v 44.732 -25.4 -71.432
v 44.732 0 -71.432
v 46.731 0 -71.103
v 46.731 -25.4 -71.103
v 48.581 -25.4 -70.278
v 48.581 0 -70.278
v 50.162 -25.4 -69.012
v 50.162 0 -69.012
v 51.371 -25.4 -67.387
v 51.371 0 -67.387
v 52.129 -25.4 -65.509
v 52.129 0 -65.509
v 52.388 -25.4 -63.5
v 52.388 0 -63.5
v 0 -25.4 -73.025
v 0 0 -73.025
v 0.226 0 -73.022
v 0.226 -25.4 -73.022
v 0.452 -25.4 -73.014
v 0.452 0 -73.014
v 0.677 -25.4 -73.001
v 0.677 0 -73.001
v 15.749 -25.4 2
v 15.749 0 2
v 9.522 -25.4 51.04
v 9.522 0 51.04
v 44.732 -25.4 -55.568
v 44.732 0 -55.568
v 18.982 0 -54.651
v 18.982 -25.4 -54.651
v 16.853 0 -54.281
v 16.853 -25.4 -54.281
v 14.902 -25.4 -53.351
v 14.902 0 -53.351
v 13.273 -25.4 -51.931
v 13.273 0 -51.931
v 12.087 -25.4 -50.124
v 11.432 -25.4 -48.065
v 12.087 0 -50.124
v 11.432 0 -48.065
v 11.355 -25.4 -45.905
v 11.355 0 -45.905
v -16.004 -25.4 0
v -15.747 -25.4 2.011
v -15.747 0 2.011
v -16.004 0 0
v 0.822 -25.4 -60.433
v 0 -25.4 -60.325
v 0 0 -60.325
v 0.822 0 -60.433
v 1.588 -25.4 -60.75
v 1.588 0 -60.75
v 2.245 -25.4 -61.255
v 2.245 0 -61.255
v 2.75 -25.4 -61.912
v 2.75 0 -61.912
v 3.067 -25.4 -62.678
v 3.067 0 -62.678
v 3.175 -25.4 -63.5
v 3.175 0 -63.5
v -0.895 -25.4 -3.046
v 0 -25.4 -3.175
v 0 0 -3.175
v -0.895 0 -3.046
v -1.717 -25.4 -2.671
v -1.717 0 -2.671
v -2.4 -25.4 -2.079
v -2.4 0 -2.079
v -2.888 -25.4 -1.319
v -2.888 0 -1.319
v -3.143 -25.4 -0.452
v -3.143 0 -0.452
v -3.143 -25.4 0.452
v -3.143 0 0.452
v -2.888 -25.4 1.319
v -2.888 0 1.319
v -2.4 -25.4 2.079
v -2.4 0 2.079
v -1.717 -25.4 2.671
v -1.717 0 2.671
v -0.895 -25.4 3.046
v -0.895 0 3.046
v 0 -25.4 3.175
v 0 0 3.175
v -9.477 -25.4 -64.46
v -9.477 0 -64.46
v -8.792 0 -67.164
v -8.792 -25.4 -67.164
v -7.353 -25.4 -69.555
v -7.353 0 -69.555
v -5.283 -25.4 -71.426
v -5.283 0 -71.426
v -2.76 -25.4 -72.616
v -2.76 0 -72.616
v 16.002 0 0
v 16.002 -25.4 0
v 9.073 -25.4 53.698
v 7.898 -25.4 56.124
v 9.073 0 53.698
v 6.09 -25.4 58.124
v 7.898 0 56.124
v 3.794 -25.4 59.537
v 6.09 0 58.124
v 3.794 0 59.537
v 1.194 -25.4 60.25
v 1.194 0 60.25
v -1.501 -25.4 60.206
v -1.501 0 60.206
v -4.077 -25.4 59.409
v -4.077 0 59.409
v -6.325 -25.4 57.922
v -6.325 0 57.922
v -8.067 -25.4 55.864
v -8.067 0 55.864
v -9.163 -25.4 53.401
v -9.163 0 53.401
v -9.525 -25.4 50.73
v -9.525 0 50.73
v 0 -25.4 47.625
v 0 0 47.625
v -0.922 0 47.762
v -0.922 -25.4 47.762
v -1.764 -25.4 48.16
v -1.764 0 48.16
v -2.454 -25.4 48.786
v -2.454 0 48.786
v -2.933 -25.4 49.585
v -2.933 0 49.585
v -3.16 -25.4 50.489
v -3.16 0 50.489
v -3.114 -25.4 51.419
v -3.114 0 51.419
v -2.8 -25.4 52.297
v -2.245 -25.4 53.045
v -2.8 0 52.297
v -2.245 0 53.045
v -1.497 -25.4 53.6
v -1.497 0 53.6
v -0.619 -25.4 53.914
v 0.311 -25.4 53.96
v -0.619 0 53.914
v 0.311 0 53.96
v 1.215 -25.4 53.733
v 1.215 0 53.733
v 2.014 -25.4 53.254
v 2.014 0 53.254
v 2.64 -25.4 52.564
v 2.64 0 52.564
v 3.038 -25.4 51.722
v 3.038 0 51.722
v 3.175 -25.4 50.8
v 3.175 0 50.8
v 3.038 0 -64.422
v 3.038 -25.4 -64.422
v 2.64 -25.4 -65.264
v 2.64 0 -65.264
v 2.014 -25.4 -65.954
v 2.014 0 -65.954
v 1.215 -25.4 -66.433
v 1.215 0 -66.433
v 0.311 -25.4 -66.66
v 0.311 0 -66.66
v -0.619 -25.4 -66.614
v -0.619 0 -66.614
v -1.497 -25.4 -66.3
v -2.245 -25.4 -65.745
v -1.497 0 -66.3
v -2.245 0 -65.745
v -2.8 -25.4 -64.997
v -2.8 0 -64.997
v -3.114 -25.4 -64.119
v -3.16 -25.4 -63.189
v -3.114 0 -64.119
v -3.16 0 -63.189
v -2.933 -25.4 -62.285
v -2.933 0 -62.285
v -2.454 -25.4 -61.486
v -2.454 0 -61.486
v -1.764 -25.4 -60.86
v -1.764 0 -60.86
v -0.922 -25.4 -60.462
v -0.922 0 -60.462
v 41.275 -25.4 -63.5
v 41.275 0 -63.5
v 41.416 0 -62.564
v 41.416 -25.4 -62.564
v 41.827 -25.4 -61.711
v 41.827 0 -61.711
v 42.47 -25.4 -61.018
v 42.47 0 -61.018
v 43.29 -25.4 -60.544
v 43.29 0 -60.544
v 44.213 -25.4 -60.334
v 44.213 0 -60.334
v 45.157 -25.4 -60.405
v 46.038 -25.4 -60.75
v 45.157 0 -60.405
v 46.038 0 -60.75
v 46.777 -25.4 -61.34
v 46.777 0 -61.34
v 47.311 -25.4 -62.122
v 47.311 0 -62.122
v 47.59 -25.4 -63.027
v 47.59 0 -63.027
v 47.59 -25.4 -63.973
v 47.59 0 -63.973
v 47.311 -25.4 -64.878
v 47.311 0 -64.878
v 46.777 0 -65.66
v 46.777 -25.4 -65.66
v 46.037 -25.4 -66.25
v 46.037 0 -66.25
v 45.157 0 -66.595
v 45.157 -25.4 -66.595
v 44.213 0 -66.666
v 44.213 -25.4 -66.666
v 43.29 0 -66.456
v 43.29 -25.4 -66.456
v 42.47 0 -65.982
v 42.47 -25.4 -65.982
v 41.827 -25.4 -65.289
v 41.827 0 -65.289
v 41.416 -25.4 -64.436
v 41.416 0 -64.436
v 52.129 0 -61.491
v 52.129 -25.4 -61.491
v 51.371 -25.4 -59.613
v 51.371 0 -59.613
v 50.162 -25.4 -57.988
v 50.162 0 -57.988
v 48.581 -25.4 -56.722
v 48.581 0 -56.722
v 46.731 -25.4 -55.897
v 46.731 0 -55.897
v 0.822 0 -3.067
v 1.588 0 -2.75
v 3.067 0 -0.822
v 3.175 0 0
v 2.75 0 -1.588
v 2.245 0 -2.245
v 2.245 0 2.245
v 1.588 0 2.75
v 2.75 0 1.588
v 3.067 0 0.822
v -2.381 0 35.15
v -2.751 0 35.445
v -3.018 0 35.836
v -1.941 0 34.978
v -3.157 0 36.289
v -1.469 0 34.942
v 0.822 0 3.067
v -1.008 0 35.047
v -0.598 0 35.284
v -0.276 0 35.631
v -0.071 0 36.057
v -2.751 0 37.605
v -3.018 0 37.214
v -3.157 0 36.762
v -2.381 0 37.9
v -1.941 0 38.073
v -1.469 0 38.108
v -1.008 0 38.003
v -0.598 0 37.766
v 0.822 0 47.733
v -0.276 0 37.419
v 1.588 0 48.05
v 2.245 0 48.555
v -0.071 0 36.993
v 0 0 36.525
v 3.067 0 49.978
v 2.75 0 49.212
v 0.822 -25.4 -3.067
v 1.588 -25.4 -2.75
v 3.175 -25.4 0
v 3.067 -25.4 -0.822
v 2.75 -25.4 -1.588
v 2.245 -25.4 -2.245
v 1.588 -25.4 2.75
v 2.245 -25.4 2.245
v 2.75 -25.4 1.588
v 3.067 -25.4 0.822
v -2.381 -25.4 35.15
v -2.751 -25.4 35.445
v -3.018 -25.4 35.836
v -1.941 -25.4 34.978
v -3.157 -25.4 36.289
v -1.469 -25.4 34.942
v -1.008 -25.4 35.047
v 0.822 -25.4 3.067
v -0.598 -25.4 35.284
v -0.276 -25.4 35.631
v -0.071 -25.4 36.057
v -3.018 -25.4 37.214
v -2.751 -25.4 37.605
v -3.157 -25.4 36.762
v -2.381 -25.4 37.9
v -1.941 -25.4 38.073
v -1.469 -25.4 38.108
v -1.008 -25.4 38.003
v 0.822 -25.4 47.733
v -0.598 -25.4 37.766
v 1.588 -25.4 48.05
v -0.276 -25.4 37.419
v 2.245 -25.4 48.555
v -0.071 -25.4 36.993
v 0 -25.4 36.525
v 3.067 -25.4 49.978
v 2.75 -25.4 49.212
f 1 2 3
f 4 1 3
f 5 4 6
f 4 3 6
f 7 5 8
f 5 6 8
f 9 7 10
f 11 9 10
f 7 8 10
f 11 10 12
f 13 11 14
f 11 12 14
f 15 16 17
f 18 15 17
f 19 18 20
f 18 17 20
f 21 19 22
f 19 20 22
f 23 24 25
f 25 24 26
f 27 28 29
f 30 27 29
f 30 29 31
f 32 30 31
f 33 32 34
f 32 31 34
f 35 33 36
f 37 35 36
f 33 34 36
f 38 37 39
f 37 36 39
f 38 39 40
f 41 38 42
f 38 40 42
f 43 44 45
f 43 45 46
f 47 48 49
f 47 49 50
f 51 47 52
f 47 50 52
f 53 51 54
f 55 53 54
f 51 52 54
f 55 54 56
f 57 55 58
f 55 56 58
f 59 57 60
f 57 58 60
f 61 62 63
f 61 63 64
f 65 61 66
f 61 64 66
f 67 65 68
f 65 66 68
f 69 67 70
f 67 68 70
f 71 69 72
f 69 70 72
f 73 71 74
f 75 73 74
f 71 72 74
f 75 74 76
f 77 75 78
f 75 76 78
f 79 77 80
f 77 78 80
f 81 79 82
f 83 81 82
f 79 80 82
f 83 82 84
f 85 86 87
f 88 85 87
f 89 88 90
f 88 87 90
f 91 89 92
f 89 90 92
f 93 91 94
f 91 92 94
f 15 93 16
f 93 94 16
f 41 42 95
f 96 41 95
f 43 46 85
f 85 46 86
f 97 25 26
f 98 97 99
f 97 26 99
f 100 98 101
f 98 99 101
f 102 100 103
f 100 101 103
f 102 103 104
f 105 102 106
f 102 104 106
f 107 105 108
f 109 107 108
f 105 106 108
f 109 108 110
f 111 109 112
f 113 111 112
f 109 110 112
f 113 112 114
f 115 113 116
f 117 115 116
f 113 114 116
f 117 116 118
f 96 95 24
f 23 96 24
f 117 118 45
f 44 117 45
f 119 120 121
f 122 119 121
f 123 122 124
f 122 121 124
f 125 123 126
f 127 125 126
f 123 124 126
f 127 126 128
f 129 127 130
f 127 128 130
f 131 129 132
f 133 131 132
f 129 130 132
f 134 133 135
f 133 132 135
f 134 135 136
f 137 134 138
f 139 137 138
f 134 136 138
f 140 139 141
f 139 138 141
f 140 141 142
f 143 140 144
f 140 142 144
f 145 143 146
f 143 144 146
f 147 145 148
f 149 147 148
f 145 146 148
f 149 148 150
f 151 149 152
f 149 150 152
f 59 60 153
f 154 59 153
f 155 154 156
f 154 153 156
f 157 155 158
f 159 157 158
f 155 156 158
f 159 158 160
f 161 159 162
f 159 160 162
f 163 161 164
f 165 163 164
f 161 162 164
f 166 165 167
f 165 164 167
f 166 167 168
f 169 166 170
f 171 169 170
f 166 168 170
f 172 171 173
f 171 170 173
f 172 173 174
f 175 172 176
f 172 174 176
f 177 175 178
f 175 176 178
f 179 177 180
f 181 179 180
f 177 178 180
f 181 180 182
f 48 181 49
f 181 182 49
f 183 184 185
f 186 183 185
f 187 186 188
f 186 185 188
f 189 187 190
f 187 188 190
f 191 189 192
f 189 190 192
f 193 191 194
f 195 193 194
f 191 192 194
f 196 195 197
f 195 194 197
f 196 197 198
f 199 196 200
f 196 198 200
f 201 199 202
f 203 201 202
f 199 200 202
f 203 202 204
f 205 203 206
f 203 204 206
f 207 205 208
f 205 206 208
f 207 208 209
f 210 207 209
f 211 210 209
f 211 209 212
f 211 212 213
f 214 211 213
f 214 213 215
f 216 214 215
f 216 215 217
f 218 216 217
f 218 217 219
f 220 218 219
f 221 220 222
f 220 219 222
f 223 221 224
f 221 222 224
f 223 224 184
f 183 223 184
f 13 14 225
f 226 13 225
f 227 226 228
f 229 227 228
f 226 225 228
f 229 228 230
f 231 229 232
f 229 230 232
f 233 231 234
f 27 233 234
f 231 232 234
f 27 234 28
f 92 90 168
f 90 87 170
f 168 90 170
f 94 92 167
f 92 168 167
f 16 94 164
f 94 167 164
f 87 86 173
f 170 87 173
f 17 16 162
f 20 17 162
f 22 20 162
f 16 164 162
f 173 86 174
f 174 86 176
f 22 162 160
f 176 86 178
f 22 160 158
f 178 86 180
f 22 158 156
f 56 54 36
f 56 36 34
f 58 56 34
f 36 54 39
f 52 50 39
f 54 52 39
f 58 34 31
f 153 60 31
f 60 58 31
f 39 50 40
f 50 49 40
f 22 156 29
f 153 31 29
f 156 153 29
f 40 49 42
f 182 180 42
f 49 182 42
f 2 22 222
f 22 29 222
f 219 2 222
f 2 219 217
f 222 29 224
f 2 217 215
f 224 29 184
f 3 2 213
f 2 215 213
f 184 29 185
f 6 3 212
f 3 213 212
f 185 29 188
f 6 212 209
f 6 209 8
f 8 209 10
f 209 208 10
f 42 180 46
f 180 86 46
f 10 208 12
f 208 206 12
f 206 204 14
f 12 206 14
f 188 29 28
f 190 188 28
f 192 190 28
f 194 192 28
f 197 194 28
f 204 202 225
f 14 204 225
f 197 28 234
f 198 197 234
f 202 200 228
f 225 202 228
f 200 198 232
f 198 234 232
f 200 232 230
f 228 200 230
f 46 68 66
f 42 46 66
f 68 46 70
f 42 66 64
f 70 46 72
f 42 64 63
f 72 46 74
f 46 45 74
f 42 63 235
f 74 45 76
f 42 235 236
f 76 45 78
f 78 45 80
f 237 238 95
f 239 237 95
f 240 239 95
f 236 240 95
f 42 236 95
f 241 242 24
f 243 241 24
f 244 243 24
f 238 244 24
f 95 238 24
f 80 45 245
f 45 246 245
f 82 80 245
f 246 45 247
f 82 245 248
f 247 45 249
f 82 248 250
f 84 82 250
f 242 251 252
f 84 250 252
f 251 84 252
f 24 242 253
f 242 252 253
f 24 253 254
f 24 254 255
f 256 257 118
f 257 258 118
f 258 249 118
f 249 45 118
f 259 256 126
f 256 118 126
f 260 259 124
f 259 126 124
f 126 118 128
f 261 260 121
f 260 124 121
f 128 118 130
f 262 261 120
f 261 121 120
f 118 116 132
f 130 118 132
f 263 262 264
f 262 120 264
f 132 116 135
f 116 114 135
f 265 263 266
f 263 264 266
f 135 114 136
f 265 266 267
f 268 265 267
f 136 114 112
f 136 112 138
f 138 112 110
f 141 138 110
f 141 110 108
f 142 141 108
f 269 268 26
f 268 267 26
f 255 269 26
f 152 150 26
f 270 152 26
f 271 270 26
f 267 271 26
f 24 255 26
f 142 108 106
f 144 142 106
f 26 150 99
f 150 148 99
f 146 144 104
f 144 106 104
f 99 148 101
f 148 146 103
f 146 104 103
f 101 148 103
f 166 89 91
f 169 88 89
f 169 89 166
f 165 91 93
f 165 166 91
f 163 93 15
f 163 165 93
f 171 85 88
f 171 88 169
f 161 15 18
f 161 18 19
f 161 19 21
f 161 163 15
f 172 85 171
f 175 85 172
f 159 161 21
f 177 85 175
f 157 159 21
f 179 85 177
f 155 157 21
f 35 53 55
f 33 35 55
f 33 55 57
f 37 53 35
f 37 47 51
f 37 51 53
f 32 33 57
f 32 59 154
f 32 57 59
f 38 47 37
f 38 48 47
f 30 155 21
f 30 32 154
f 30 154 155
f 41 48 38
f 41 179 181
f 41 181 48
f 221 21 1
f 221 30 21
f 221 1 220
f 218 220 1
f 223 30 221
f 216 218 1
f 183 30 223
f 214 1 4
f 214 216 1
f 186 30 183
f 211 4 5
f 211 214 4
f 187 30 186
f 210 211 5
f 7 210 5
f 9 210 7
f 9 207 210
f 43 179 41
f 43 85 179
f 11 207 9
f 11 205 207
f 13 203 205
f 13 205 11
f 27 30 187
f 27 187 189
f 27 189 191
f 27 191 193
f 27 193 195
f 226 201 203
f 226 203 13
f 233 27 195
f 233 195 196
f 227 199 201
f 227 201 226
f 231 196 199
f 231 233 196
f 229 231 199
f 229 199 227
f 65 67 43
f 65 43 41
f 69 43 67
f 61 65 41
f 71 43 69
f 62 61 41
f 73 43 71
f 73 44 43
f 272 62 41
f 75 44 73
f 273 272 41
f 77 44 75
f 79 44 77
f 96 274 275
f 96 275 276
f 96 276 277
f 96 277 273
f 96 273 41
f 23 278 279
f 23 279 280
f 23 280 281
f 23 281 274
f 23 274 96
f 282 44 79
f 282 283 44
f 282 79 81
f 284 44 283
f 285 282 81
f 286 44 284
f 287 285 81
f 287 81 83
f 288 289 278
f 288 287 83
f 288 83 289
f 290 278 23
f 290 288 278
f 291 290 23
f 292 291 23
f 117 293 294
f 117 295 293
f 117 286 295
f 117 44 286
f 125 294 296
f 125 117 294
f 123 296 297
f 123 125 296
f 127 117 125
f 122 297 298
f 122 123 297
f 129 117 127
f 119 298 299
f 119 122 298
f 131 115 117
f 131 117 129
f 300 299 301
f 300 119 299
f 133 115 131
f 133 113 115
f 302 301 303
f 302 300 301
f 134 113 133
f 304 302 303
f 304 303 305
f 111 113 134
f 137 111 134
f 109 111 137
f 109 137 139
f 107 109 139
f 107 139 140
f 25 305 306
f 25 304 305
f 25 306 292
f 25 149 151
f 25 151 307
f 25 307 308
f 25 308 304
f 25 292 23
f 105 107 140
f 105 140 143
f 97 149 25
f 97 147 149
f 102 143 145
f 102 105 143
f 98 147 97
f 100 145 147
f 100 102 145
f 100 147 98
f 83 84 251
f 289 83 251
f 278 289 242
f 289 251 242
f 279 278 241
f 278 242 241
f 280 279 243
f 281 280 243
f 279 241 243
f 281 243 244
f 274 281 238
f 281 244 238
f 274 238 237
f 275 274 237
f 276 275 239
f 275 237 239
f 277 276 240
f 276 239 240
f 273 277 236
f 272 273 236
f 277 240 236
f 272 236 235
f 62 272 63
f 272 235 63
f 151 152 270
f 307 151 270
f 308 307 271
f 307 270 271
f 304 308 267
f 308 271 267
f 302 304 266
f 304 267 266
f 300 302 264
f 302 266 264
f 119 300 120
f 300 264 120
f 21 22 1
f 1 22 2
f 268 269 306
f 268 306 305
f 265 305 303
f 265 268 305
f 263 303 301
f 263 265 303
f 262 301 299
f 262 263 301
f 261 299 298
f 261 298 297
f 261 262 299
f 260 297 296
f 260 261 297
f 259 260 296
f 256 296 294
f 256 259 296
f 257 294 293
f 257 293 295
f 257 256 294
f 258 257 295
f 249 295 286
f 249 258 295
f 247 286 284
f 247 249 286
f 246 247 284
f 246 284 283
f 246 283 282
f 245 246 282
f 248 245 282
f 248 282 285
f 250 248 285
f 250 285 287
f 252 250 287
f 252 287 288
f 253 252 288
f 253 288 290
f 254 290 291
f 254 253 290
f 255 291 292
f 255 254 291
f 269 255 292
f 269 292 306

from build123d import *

# Parameters (mm, degrees)
F0_R     = 1.5875
F1_DEPTH = 25.4


with BuildPart() as f1:
    # F0 (on Front) → F1 (new body)
    with BuildSketch(Plane.XZ):
        with BuildLine():
            ThreePointArc((0, -3.175), (-3.175, 0), (0, 3.175))
            Line((0, 3.175), (0, 15.875))
            ThreePointArc((0, 15.875), (-10.4901713759, 11.9151974178), (-15.7470819389, 2.0112273392))
            ThreePointArc((-15.7470819389, 2.0112273392), (-11.9151974178, -10.4901713759), (0, -15.875))
            Line((0, -15.875), (0, -3.175))
        make_face()
        with BuildLine():
            Line((0, 15.875), (0, 3.175))
            ThreePointArc((0, 3.175), (2.2450640303, 2.2450640303), (3.175, 0))
            ThreePointArc((3.175, 0), (2.2450640303, -2.2450640303), (0, -3.175))
            Line((0, -3.175), (0, -15.875))
            ThreePointArc((0, -15.875), (11.2253201513, -11.2253201513), (15.875, 0))
            ThreePointArc((15.875, 0), (15.8433599301, 1.0017839713), (15.7485658425, 1.9995746809))
            ThreePointArc((15.7485658425, 1.9995746809), (10.4945790039, 11.9113154828), (0, 15.875))
        make_face()
        with BuildLine():
            ThreePointArc((-15.7470819389, 2.0112273392), (-10.4901713759, 11.9151974178), (0, 15.875))
            Line((0, 15.875), (0, 36.5252))
            Line((0, 36.5252), (0, 41.275))
            ThreePointArc((0, 41.275), (-6.7102581313, 44.0399659164), (-9.5247398797, 50.7296066537))
            Line((-9.5247398797, 50.7296066537), (-15.7470819389, 2.0112273392))
        make_face()
        with Locations((-1.5875, 36.5252)):
            Circle(F0_R, mode=Mode.SUBTRACT)
        with BuildLine():
            Line((0, 36.5252), (0, 15.875))
            ThreePointArc((0, 15.875), (10.4945790039, 11.9113154828), (15.7485658425, 1.9995746809))
            Line((15.7485658425, 1.9995746809), (9.5219777707, 51.0399256846))
            ThreePointArc((9.5219777707, 51.0399256846), (9.5242444127, 50.9199723593), (9.525, 50.8))
            ThreePointArc((9.525, 50.8), (6.7351920908, 44.0648079092), (0, 41.275))
            Line((0, 41.275), (0, 36.5252))
        make_face()
        with BuildLine():
            ThreePointArc((15.875, 0), (11.2253201513, -11.2253201513), (0, -15.875))
            Line((0, -15.875), (0, -53.975))
            ThreePointArc((0, -53.975), (6.7351920908, -56.7648079092), (9.525, -63.5))
            Line((9.525, -63.5), (36.5125, -63.5))
            ThreePointArc((36.5125, -63.5), (38.9380895153, -57.7883672161), (44.7324052746, -55.5675253854))
            Line((44.7324052746, -55.5675253854), (18.9819405343, -54.6507790461))
            ThreePointArc((18.9819405343, -54.6507790461), (13.2729113611, -51.9308376972), (11.3550302967, -45.9048251463))
            Line((11.3550302967, -45.9048251463), (16.0024491774, 0))
            Line((16.0024491774, 0), (15.7485658425, 1.9995746809))
            ThreePointArc((15.7485658425, 1.9995746809), (15.8433599301, 1.0017839713), (15.875, 0))
        make_face()
        with BuildLine():
            Line((0, -53.975), (0, -15.875))
            ThreePointArc((0, -15.875), (-11.9151974178, -10.4901713759), (-15.7470819389, 2.0112273392))
            Line((-15.7470819389, 2.0112273392), (-16.0039571601, 0))
            Line((-16.0039571601, 0), (-9.4765361199, -64.4596291825))
            ThreePointArc((-9.4765361199, -64.4596291825), (-7.0663318972, -57.1130931964), (0, -53.975))
        make_face()
        with BuildLine():
            Line((0, -60.325), (0, -53.975))
            ThreePointArc((0, -53.975), (-7.0663318972, -57.1130931964), (-9.4765361199, -64.4596291825))
            ThreePointArc((-9.4765361199, -64.4596291825), (-6.3869068036, -70.5663318972), (0, -73.025))
            Line((0, -73.025), (0.6773435479, -73.000885786))
            ThreePointArc((0.6773435479, -73.000885786), (6.9705567315, -69.9912990883), (9.525, -63.5))
            Line((9.525, -63.5), (3.175, -63.5))
            ThreePointArc((3.175, -63.5), (-2.2450640303, -65.7450640303), (0, -60.325))
        make_face()
        with BuildLine():
            ThreePointArc((-9.5247398797, 50.7296066537), (-6.7102581313, 44.0399659164), (0, 41.275))
            ThreePointArc((0, 41.275), (6.7351920908, 44.0648079092), (9.525, 50.8))
            ThreePointArc((9.525, 50.8), (9.5242444127, 50.9199723593), (9.5219777707, 51.0399256846))
            ThreePointArc((9.5219777707, 51.0399256846), (-0.1551656616, 60.323736064), (-9.5247398797, 50.7296066537))
        make_face()
        with BuildLine():
            ThreePointArc((3.175, 50.8), (2.2450640303, 48.5549359697), (0, 47.625))
            ThreePointArc((0, 47.625), (-2.2450640303, 53.0450640303), (3.175, 50.8))
        make_face(mode=Mode.SUBTRACT)
        with BuildLine():
            Line((36.5125, -63.5), (9.525, -63.5))
            ThreePointArc((9.525, -63.5), (6.9705567315, -69.9912990883), (0.6773435479, -73.000885786))
            Line((0.6773435479, -73.000885786), (44.7324052746, -71.4324746146))
            ThreePointArc((44.7324052746, -71.4324746146), (38.9380895153, -69.2116327839), (36.5125, -63.5))
        make_face()
        with BuildLine():
            ThreePointArc((44.7324052746, -55.5675253854), (38.9380895153, -57.7883672161), (36.5125, -63.5))
            ThreePointArc((36.5125, -63.5), (38.9380895153, -69.2116327839), (44.7324052746, -71.4324746146))
            ThreePointArc((44.7324052746, -71.4324746146), (50.1616327839, -69.0119104847), (52.3875, -63.5))
            ThreePointArc((52.3875, -63.5), (50.1616327839, -57.9880895153), (44.7324052746, -55.5675253854))
        make_face()
        with BuildLine():
            ThreePointArc((47.625, -63.5), (44.45, -66.675), (41.275, -63.5))
            ThreePointArc((41.275, -63.5), (44.45, -60.325), (47.625, -63.5))
        make_face(mode=Mode.SUBTRACT)
        with BuildLine():
            ThreePointArc((0, -73.025), (0.3388863295, -73.0189695375), (0.6773435479, -73.000885786))
            Line((0.6773435479, -73.000885786), (0, -73.025))
        make_face()
        with BuildLine():
            ThreePointArc((9.525, -63.5), (6.7351920908, -56.7648079092), (0, -53.975))
            Line((0, -53.975), (0, -60.325))
            ThreePointArc((0, -60.325), (2.2450640303, -61.2549359697), (3.175, -63.5))
            Line((3.175, -63.5), (9.525, -63.5))
        make_face()
    extrude(amount=F1_DEPTH)


solid = f1.part
